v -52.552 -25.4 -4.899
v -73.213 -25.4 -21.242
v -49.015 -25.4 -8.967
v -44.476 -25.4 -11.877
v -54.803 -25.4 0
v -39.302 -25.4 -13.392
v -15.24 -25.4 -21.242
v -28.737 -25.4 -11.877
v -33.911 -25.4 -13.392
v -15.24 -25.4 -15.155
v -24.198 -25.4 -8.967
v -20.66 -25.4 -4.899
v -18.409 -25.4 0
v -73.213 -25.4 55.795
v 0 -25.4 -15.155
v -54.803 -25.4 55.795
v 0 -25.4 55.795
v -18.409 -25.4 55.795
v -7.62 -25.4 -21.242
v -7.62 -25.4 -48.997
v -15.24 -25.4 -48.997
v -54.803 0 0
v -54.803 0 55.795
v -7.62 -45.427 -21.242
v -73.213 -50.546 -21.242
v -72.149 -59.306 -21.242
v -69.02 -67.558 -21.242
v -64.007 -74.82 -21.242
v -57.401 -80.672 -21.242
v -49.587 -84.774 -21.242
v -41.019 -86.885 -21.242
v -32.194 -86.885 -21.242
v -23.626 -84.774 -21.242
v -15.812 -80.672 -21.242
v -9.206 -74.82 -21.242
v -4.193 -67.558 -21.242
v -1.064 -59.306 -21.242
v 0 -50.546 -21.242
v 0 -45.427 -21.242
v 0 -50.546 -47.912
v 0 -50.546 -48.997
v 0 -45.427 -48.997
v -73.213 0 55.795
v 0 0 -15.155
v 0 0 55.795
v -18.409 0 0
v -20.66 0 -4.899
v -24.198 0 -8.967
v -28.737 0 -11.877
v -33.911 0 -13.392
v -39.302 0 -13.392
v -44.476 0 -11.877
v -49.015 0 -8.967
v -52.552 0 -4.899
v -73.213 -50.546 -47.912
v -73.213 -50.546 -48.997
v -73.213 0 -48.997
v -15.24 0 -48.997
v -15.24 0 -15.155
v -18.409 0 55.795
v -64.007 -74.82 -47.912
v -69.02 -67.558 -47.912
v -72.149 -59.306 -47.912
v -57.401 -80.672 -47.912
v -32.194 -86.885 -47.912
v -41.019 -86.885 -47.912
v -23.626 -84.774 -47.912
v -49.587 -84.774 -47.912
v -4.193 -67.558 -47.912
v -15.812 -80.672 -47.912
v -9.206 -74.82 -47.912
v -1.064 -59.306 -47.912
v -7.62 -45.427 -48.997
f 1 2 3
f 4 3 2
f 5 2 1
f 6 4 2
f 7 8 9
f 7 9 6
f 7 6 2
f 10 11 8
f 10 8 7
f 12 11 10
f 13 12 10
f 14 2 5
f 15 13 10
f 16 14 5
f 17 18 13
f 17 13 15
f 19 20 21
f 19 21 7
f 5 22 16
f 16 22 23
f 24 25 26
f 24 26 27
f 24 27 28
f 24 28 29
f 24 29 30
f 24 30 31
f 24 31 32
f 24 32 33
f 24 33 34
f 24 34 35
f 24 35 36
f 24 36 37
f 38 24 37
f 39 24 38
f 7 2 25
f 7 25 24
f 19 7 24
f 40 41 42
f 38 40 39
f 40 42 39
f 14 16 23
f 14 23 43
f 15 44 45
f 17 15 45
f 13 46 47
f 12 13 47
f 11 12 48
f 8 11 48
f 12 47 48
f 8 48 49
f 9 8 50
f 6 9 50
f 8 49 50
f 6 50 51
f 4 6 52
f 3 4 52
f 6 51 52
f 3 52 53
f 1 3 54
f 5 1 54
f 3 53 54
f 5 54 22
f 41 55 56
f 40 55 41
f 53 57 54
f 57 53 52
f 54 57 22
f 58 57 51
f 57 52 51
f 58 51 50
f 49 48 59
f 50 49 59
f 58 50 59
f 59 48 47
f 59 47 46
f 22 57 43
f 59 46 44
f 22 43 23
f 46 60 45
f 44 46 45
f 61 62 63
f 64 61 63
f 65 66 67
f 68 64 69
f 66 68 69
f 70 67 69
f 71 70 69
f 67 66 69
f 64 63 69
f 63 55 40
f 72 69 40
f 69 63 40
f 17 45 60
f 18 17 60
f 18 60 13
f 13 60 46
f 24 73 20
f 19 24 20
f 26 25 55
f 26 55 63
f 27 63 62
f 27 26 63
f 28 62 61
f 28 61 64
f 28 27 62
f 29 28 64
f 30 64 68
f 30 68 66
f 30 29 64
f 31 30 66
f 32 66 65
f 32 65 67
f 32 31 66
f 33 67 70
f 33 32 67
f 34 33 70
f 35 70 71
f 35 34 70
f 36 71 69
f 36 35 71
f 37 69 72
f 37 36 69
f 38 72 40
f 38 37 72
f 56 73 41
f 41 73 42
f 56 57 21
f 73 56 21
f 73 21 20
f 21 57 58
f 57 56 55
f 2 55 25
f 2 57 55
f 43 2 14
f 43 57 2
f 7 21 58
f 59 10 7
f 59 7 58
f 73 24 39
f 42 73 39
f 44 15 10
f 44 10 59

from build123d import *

# Parameters (mm, degrees)
F1_DEPTH = 25.4
F0_W     = 73.2126906514
F0_H     = 27.755683288
F2_DEPTH = 50.546
F4_DEPTH = 26.67
F5_W     = 25.4
F5_H     = 33.8419238105
F6_DEPTH = 15.24
F7_W     = 7.62
F7_H     = 20.0272031784
F8_DEPTH = 27.756683288


with BuildPart() as f1:
    # F0 (on Front) → F1 (new body)
    with BuildSketch(Plane.XZ):
        with BuildLine():
            Line((-54.8033118248, 55.7945854962), (-73.2126906514, 55.7945854962))
            Line((-73.2126906514, 55.7945854962), (-73.2126906514, -21.2415922433))
            Line((-73.2126906514, -21.2415922433), (0, -21.2415922433))
            Line((0, -21.2415922433), (0, 55.7945854962))
            Line((0, 55.7945854962), (-18.4093788266, 55.7945854962))
            Line((-18.4093788266, 55.7945854962), (-18.4093788266, 0))
            ThreePointArc((-18.4093788266, 0), (-36.6063453257, -13.5848598971), (-54.8033118248, 0))
            Line((-54.8033118248, 0), (-54.8033118248, 55.7945854962))
        make_face()
    extrude(amount=F1_DEPTH)

    # F0 (on Front) → F2 (join)
    with BuildSketch(Plane.XZ):
        with Locations((-36.6063453257, -35.1194338873)):
            Rectangle(F0_W, F0_H)
    extrude(amount=F2_DEPTH)

    # F3 (on face) → F4 (join)
    with BuildSketch(Plane.XY.offset(-21.2415922433)):
        with BuildLine():
            Line((0, -50.546), (-73.2126906514, -50.546))
            ThreePointArc((-73.2126906514, -50.546), (-36.6063453257, -87.1523453257), (0, -50.546))
        make_face()
    extrude(amount=-F4_DEPTH)

    # F5 (on face) → F6 (cut)
    with BuildSketch(Plane.YZ):
        with Locations((-12.7, -32.076313626)):
            Rectangle(F5_W, F5_H)
    extrude(amount=-F6_DEPTH, mode=Mode.SUBTRACT)

    # F7 (on face) → F8 (cut, through all)
    with BuildSketch(Plane.XY.offset(-21.2415922433)):
        with Locations((-3.81, -35.4136015892)):
            Rectangle(F7_W, F7_H)
    extrude(amount=-F8_DEPTH, mode=Mode.SUBTRACT)


solid = f1.part
